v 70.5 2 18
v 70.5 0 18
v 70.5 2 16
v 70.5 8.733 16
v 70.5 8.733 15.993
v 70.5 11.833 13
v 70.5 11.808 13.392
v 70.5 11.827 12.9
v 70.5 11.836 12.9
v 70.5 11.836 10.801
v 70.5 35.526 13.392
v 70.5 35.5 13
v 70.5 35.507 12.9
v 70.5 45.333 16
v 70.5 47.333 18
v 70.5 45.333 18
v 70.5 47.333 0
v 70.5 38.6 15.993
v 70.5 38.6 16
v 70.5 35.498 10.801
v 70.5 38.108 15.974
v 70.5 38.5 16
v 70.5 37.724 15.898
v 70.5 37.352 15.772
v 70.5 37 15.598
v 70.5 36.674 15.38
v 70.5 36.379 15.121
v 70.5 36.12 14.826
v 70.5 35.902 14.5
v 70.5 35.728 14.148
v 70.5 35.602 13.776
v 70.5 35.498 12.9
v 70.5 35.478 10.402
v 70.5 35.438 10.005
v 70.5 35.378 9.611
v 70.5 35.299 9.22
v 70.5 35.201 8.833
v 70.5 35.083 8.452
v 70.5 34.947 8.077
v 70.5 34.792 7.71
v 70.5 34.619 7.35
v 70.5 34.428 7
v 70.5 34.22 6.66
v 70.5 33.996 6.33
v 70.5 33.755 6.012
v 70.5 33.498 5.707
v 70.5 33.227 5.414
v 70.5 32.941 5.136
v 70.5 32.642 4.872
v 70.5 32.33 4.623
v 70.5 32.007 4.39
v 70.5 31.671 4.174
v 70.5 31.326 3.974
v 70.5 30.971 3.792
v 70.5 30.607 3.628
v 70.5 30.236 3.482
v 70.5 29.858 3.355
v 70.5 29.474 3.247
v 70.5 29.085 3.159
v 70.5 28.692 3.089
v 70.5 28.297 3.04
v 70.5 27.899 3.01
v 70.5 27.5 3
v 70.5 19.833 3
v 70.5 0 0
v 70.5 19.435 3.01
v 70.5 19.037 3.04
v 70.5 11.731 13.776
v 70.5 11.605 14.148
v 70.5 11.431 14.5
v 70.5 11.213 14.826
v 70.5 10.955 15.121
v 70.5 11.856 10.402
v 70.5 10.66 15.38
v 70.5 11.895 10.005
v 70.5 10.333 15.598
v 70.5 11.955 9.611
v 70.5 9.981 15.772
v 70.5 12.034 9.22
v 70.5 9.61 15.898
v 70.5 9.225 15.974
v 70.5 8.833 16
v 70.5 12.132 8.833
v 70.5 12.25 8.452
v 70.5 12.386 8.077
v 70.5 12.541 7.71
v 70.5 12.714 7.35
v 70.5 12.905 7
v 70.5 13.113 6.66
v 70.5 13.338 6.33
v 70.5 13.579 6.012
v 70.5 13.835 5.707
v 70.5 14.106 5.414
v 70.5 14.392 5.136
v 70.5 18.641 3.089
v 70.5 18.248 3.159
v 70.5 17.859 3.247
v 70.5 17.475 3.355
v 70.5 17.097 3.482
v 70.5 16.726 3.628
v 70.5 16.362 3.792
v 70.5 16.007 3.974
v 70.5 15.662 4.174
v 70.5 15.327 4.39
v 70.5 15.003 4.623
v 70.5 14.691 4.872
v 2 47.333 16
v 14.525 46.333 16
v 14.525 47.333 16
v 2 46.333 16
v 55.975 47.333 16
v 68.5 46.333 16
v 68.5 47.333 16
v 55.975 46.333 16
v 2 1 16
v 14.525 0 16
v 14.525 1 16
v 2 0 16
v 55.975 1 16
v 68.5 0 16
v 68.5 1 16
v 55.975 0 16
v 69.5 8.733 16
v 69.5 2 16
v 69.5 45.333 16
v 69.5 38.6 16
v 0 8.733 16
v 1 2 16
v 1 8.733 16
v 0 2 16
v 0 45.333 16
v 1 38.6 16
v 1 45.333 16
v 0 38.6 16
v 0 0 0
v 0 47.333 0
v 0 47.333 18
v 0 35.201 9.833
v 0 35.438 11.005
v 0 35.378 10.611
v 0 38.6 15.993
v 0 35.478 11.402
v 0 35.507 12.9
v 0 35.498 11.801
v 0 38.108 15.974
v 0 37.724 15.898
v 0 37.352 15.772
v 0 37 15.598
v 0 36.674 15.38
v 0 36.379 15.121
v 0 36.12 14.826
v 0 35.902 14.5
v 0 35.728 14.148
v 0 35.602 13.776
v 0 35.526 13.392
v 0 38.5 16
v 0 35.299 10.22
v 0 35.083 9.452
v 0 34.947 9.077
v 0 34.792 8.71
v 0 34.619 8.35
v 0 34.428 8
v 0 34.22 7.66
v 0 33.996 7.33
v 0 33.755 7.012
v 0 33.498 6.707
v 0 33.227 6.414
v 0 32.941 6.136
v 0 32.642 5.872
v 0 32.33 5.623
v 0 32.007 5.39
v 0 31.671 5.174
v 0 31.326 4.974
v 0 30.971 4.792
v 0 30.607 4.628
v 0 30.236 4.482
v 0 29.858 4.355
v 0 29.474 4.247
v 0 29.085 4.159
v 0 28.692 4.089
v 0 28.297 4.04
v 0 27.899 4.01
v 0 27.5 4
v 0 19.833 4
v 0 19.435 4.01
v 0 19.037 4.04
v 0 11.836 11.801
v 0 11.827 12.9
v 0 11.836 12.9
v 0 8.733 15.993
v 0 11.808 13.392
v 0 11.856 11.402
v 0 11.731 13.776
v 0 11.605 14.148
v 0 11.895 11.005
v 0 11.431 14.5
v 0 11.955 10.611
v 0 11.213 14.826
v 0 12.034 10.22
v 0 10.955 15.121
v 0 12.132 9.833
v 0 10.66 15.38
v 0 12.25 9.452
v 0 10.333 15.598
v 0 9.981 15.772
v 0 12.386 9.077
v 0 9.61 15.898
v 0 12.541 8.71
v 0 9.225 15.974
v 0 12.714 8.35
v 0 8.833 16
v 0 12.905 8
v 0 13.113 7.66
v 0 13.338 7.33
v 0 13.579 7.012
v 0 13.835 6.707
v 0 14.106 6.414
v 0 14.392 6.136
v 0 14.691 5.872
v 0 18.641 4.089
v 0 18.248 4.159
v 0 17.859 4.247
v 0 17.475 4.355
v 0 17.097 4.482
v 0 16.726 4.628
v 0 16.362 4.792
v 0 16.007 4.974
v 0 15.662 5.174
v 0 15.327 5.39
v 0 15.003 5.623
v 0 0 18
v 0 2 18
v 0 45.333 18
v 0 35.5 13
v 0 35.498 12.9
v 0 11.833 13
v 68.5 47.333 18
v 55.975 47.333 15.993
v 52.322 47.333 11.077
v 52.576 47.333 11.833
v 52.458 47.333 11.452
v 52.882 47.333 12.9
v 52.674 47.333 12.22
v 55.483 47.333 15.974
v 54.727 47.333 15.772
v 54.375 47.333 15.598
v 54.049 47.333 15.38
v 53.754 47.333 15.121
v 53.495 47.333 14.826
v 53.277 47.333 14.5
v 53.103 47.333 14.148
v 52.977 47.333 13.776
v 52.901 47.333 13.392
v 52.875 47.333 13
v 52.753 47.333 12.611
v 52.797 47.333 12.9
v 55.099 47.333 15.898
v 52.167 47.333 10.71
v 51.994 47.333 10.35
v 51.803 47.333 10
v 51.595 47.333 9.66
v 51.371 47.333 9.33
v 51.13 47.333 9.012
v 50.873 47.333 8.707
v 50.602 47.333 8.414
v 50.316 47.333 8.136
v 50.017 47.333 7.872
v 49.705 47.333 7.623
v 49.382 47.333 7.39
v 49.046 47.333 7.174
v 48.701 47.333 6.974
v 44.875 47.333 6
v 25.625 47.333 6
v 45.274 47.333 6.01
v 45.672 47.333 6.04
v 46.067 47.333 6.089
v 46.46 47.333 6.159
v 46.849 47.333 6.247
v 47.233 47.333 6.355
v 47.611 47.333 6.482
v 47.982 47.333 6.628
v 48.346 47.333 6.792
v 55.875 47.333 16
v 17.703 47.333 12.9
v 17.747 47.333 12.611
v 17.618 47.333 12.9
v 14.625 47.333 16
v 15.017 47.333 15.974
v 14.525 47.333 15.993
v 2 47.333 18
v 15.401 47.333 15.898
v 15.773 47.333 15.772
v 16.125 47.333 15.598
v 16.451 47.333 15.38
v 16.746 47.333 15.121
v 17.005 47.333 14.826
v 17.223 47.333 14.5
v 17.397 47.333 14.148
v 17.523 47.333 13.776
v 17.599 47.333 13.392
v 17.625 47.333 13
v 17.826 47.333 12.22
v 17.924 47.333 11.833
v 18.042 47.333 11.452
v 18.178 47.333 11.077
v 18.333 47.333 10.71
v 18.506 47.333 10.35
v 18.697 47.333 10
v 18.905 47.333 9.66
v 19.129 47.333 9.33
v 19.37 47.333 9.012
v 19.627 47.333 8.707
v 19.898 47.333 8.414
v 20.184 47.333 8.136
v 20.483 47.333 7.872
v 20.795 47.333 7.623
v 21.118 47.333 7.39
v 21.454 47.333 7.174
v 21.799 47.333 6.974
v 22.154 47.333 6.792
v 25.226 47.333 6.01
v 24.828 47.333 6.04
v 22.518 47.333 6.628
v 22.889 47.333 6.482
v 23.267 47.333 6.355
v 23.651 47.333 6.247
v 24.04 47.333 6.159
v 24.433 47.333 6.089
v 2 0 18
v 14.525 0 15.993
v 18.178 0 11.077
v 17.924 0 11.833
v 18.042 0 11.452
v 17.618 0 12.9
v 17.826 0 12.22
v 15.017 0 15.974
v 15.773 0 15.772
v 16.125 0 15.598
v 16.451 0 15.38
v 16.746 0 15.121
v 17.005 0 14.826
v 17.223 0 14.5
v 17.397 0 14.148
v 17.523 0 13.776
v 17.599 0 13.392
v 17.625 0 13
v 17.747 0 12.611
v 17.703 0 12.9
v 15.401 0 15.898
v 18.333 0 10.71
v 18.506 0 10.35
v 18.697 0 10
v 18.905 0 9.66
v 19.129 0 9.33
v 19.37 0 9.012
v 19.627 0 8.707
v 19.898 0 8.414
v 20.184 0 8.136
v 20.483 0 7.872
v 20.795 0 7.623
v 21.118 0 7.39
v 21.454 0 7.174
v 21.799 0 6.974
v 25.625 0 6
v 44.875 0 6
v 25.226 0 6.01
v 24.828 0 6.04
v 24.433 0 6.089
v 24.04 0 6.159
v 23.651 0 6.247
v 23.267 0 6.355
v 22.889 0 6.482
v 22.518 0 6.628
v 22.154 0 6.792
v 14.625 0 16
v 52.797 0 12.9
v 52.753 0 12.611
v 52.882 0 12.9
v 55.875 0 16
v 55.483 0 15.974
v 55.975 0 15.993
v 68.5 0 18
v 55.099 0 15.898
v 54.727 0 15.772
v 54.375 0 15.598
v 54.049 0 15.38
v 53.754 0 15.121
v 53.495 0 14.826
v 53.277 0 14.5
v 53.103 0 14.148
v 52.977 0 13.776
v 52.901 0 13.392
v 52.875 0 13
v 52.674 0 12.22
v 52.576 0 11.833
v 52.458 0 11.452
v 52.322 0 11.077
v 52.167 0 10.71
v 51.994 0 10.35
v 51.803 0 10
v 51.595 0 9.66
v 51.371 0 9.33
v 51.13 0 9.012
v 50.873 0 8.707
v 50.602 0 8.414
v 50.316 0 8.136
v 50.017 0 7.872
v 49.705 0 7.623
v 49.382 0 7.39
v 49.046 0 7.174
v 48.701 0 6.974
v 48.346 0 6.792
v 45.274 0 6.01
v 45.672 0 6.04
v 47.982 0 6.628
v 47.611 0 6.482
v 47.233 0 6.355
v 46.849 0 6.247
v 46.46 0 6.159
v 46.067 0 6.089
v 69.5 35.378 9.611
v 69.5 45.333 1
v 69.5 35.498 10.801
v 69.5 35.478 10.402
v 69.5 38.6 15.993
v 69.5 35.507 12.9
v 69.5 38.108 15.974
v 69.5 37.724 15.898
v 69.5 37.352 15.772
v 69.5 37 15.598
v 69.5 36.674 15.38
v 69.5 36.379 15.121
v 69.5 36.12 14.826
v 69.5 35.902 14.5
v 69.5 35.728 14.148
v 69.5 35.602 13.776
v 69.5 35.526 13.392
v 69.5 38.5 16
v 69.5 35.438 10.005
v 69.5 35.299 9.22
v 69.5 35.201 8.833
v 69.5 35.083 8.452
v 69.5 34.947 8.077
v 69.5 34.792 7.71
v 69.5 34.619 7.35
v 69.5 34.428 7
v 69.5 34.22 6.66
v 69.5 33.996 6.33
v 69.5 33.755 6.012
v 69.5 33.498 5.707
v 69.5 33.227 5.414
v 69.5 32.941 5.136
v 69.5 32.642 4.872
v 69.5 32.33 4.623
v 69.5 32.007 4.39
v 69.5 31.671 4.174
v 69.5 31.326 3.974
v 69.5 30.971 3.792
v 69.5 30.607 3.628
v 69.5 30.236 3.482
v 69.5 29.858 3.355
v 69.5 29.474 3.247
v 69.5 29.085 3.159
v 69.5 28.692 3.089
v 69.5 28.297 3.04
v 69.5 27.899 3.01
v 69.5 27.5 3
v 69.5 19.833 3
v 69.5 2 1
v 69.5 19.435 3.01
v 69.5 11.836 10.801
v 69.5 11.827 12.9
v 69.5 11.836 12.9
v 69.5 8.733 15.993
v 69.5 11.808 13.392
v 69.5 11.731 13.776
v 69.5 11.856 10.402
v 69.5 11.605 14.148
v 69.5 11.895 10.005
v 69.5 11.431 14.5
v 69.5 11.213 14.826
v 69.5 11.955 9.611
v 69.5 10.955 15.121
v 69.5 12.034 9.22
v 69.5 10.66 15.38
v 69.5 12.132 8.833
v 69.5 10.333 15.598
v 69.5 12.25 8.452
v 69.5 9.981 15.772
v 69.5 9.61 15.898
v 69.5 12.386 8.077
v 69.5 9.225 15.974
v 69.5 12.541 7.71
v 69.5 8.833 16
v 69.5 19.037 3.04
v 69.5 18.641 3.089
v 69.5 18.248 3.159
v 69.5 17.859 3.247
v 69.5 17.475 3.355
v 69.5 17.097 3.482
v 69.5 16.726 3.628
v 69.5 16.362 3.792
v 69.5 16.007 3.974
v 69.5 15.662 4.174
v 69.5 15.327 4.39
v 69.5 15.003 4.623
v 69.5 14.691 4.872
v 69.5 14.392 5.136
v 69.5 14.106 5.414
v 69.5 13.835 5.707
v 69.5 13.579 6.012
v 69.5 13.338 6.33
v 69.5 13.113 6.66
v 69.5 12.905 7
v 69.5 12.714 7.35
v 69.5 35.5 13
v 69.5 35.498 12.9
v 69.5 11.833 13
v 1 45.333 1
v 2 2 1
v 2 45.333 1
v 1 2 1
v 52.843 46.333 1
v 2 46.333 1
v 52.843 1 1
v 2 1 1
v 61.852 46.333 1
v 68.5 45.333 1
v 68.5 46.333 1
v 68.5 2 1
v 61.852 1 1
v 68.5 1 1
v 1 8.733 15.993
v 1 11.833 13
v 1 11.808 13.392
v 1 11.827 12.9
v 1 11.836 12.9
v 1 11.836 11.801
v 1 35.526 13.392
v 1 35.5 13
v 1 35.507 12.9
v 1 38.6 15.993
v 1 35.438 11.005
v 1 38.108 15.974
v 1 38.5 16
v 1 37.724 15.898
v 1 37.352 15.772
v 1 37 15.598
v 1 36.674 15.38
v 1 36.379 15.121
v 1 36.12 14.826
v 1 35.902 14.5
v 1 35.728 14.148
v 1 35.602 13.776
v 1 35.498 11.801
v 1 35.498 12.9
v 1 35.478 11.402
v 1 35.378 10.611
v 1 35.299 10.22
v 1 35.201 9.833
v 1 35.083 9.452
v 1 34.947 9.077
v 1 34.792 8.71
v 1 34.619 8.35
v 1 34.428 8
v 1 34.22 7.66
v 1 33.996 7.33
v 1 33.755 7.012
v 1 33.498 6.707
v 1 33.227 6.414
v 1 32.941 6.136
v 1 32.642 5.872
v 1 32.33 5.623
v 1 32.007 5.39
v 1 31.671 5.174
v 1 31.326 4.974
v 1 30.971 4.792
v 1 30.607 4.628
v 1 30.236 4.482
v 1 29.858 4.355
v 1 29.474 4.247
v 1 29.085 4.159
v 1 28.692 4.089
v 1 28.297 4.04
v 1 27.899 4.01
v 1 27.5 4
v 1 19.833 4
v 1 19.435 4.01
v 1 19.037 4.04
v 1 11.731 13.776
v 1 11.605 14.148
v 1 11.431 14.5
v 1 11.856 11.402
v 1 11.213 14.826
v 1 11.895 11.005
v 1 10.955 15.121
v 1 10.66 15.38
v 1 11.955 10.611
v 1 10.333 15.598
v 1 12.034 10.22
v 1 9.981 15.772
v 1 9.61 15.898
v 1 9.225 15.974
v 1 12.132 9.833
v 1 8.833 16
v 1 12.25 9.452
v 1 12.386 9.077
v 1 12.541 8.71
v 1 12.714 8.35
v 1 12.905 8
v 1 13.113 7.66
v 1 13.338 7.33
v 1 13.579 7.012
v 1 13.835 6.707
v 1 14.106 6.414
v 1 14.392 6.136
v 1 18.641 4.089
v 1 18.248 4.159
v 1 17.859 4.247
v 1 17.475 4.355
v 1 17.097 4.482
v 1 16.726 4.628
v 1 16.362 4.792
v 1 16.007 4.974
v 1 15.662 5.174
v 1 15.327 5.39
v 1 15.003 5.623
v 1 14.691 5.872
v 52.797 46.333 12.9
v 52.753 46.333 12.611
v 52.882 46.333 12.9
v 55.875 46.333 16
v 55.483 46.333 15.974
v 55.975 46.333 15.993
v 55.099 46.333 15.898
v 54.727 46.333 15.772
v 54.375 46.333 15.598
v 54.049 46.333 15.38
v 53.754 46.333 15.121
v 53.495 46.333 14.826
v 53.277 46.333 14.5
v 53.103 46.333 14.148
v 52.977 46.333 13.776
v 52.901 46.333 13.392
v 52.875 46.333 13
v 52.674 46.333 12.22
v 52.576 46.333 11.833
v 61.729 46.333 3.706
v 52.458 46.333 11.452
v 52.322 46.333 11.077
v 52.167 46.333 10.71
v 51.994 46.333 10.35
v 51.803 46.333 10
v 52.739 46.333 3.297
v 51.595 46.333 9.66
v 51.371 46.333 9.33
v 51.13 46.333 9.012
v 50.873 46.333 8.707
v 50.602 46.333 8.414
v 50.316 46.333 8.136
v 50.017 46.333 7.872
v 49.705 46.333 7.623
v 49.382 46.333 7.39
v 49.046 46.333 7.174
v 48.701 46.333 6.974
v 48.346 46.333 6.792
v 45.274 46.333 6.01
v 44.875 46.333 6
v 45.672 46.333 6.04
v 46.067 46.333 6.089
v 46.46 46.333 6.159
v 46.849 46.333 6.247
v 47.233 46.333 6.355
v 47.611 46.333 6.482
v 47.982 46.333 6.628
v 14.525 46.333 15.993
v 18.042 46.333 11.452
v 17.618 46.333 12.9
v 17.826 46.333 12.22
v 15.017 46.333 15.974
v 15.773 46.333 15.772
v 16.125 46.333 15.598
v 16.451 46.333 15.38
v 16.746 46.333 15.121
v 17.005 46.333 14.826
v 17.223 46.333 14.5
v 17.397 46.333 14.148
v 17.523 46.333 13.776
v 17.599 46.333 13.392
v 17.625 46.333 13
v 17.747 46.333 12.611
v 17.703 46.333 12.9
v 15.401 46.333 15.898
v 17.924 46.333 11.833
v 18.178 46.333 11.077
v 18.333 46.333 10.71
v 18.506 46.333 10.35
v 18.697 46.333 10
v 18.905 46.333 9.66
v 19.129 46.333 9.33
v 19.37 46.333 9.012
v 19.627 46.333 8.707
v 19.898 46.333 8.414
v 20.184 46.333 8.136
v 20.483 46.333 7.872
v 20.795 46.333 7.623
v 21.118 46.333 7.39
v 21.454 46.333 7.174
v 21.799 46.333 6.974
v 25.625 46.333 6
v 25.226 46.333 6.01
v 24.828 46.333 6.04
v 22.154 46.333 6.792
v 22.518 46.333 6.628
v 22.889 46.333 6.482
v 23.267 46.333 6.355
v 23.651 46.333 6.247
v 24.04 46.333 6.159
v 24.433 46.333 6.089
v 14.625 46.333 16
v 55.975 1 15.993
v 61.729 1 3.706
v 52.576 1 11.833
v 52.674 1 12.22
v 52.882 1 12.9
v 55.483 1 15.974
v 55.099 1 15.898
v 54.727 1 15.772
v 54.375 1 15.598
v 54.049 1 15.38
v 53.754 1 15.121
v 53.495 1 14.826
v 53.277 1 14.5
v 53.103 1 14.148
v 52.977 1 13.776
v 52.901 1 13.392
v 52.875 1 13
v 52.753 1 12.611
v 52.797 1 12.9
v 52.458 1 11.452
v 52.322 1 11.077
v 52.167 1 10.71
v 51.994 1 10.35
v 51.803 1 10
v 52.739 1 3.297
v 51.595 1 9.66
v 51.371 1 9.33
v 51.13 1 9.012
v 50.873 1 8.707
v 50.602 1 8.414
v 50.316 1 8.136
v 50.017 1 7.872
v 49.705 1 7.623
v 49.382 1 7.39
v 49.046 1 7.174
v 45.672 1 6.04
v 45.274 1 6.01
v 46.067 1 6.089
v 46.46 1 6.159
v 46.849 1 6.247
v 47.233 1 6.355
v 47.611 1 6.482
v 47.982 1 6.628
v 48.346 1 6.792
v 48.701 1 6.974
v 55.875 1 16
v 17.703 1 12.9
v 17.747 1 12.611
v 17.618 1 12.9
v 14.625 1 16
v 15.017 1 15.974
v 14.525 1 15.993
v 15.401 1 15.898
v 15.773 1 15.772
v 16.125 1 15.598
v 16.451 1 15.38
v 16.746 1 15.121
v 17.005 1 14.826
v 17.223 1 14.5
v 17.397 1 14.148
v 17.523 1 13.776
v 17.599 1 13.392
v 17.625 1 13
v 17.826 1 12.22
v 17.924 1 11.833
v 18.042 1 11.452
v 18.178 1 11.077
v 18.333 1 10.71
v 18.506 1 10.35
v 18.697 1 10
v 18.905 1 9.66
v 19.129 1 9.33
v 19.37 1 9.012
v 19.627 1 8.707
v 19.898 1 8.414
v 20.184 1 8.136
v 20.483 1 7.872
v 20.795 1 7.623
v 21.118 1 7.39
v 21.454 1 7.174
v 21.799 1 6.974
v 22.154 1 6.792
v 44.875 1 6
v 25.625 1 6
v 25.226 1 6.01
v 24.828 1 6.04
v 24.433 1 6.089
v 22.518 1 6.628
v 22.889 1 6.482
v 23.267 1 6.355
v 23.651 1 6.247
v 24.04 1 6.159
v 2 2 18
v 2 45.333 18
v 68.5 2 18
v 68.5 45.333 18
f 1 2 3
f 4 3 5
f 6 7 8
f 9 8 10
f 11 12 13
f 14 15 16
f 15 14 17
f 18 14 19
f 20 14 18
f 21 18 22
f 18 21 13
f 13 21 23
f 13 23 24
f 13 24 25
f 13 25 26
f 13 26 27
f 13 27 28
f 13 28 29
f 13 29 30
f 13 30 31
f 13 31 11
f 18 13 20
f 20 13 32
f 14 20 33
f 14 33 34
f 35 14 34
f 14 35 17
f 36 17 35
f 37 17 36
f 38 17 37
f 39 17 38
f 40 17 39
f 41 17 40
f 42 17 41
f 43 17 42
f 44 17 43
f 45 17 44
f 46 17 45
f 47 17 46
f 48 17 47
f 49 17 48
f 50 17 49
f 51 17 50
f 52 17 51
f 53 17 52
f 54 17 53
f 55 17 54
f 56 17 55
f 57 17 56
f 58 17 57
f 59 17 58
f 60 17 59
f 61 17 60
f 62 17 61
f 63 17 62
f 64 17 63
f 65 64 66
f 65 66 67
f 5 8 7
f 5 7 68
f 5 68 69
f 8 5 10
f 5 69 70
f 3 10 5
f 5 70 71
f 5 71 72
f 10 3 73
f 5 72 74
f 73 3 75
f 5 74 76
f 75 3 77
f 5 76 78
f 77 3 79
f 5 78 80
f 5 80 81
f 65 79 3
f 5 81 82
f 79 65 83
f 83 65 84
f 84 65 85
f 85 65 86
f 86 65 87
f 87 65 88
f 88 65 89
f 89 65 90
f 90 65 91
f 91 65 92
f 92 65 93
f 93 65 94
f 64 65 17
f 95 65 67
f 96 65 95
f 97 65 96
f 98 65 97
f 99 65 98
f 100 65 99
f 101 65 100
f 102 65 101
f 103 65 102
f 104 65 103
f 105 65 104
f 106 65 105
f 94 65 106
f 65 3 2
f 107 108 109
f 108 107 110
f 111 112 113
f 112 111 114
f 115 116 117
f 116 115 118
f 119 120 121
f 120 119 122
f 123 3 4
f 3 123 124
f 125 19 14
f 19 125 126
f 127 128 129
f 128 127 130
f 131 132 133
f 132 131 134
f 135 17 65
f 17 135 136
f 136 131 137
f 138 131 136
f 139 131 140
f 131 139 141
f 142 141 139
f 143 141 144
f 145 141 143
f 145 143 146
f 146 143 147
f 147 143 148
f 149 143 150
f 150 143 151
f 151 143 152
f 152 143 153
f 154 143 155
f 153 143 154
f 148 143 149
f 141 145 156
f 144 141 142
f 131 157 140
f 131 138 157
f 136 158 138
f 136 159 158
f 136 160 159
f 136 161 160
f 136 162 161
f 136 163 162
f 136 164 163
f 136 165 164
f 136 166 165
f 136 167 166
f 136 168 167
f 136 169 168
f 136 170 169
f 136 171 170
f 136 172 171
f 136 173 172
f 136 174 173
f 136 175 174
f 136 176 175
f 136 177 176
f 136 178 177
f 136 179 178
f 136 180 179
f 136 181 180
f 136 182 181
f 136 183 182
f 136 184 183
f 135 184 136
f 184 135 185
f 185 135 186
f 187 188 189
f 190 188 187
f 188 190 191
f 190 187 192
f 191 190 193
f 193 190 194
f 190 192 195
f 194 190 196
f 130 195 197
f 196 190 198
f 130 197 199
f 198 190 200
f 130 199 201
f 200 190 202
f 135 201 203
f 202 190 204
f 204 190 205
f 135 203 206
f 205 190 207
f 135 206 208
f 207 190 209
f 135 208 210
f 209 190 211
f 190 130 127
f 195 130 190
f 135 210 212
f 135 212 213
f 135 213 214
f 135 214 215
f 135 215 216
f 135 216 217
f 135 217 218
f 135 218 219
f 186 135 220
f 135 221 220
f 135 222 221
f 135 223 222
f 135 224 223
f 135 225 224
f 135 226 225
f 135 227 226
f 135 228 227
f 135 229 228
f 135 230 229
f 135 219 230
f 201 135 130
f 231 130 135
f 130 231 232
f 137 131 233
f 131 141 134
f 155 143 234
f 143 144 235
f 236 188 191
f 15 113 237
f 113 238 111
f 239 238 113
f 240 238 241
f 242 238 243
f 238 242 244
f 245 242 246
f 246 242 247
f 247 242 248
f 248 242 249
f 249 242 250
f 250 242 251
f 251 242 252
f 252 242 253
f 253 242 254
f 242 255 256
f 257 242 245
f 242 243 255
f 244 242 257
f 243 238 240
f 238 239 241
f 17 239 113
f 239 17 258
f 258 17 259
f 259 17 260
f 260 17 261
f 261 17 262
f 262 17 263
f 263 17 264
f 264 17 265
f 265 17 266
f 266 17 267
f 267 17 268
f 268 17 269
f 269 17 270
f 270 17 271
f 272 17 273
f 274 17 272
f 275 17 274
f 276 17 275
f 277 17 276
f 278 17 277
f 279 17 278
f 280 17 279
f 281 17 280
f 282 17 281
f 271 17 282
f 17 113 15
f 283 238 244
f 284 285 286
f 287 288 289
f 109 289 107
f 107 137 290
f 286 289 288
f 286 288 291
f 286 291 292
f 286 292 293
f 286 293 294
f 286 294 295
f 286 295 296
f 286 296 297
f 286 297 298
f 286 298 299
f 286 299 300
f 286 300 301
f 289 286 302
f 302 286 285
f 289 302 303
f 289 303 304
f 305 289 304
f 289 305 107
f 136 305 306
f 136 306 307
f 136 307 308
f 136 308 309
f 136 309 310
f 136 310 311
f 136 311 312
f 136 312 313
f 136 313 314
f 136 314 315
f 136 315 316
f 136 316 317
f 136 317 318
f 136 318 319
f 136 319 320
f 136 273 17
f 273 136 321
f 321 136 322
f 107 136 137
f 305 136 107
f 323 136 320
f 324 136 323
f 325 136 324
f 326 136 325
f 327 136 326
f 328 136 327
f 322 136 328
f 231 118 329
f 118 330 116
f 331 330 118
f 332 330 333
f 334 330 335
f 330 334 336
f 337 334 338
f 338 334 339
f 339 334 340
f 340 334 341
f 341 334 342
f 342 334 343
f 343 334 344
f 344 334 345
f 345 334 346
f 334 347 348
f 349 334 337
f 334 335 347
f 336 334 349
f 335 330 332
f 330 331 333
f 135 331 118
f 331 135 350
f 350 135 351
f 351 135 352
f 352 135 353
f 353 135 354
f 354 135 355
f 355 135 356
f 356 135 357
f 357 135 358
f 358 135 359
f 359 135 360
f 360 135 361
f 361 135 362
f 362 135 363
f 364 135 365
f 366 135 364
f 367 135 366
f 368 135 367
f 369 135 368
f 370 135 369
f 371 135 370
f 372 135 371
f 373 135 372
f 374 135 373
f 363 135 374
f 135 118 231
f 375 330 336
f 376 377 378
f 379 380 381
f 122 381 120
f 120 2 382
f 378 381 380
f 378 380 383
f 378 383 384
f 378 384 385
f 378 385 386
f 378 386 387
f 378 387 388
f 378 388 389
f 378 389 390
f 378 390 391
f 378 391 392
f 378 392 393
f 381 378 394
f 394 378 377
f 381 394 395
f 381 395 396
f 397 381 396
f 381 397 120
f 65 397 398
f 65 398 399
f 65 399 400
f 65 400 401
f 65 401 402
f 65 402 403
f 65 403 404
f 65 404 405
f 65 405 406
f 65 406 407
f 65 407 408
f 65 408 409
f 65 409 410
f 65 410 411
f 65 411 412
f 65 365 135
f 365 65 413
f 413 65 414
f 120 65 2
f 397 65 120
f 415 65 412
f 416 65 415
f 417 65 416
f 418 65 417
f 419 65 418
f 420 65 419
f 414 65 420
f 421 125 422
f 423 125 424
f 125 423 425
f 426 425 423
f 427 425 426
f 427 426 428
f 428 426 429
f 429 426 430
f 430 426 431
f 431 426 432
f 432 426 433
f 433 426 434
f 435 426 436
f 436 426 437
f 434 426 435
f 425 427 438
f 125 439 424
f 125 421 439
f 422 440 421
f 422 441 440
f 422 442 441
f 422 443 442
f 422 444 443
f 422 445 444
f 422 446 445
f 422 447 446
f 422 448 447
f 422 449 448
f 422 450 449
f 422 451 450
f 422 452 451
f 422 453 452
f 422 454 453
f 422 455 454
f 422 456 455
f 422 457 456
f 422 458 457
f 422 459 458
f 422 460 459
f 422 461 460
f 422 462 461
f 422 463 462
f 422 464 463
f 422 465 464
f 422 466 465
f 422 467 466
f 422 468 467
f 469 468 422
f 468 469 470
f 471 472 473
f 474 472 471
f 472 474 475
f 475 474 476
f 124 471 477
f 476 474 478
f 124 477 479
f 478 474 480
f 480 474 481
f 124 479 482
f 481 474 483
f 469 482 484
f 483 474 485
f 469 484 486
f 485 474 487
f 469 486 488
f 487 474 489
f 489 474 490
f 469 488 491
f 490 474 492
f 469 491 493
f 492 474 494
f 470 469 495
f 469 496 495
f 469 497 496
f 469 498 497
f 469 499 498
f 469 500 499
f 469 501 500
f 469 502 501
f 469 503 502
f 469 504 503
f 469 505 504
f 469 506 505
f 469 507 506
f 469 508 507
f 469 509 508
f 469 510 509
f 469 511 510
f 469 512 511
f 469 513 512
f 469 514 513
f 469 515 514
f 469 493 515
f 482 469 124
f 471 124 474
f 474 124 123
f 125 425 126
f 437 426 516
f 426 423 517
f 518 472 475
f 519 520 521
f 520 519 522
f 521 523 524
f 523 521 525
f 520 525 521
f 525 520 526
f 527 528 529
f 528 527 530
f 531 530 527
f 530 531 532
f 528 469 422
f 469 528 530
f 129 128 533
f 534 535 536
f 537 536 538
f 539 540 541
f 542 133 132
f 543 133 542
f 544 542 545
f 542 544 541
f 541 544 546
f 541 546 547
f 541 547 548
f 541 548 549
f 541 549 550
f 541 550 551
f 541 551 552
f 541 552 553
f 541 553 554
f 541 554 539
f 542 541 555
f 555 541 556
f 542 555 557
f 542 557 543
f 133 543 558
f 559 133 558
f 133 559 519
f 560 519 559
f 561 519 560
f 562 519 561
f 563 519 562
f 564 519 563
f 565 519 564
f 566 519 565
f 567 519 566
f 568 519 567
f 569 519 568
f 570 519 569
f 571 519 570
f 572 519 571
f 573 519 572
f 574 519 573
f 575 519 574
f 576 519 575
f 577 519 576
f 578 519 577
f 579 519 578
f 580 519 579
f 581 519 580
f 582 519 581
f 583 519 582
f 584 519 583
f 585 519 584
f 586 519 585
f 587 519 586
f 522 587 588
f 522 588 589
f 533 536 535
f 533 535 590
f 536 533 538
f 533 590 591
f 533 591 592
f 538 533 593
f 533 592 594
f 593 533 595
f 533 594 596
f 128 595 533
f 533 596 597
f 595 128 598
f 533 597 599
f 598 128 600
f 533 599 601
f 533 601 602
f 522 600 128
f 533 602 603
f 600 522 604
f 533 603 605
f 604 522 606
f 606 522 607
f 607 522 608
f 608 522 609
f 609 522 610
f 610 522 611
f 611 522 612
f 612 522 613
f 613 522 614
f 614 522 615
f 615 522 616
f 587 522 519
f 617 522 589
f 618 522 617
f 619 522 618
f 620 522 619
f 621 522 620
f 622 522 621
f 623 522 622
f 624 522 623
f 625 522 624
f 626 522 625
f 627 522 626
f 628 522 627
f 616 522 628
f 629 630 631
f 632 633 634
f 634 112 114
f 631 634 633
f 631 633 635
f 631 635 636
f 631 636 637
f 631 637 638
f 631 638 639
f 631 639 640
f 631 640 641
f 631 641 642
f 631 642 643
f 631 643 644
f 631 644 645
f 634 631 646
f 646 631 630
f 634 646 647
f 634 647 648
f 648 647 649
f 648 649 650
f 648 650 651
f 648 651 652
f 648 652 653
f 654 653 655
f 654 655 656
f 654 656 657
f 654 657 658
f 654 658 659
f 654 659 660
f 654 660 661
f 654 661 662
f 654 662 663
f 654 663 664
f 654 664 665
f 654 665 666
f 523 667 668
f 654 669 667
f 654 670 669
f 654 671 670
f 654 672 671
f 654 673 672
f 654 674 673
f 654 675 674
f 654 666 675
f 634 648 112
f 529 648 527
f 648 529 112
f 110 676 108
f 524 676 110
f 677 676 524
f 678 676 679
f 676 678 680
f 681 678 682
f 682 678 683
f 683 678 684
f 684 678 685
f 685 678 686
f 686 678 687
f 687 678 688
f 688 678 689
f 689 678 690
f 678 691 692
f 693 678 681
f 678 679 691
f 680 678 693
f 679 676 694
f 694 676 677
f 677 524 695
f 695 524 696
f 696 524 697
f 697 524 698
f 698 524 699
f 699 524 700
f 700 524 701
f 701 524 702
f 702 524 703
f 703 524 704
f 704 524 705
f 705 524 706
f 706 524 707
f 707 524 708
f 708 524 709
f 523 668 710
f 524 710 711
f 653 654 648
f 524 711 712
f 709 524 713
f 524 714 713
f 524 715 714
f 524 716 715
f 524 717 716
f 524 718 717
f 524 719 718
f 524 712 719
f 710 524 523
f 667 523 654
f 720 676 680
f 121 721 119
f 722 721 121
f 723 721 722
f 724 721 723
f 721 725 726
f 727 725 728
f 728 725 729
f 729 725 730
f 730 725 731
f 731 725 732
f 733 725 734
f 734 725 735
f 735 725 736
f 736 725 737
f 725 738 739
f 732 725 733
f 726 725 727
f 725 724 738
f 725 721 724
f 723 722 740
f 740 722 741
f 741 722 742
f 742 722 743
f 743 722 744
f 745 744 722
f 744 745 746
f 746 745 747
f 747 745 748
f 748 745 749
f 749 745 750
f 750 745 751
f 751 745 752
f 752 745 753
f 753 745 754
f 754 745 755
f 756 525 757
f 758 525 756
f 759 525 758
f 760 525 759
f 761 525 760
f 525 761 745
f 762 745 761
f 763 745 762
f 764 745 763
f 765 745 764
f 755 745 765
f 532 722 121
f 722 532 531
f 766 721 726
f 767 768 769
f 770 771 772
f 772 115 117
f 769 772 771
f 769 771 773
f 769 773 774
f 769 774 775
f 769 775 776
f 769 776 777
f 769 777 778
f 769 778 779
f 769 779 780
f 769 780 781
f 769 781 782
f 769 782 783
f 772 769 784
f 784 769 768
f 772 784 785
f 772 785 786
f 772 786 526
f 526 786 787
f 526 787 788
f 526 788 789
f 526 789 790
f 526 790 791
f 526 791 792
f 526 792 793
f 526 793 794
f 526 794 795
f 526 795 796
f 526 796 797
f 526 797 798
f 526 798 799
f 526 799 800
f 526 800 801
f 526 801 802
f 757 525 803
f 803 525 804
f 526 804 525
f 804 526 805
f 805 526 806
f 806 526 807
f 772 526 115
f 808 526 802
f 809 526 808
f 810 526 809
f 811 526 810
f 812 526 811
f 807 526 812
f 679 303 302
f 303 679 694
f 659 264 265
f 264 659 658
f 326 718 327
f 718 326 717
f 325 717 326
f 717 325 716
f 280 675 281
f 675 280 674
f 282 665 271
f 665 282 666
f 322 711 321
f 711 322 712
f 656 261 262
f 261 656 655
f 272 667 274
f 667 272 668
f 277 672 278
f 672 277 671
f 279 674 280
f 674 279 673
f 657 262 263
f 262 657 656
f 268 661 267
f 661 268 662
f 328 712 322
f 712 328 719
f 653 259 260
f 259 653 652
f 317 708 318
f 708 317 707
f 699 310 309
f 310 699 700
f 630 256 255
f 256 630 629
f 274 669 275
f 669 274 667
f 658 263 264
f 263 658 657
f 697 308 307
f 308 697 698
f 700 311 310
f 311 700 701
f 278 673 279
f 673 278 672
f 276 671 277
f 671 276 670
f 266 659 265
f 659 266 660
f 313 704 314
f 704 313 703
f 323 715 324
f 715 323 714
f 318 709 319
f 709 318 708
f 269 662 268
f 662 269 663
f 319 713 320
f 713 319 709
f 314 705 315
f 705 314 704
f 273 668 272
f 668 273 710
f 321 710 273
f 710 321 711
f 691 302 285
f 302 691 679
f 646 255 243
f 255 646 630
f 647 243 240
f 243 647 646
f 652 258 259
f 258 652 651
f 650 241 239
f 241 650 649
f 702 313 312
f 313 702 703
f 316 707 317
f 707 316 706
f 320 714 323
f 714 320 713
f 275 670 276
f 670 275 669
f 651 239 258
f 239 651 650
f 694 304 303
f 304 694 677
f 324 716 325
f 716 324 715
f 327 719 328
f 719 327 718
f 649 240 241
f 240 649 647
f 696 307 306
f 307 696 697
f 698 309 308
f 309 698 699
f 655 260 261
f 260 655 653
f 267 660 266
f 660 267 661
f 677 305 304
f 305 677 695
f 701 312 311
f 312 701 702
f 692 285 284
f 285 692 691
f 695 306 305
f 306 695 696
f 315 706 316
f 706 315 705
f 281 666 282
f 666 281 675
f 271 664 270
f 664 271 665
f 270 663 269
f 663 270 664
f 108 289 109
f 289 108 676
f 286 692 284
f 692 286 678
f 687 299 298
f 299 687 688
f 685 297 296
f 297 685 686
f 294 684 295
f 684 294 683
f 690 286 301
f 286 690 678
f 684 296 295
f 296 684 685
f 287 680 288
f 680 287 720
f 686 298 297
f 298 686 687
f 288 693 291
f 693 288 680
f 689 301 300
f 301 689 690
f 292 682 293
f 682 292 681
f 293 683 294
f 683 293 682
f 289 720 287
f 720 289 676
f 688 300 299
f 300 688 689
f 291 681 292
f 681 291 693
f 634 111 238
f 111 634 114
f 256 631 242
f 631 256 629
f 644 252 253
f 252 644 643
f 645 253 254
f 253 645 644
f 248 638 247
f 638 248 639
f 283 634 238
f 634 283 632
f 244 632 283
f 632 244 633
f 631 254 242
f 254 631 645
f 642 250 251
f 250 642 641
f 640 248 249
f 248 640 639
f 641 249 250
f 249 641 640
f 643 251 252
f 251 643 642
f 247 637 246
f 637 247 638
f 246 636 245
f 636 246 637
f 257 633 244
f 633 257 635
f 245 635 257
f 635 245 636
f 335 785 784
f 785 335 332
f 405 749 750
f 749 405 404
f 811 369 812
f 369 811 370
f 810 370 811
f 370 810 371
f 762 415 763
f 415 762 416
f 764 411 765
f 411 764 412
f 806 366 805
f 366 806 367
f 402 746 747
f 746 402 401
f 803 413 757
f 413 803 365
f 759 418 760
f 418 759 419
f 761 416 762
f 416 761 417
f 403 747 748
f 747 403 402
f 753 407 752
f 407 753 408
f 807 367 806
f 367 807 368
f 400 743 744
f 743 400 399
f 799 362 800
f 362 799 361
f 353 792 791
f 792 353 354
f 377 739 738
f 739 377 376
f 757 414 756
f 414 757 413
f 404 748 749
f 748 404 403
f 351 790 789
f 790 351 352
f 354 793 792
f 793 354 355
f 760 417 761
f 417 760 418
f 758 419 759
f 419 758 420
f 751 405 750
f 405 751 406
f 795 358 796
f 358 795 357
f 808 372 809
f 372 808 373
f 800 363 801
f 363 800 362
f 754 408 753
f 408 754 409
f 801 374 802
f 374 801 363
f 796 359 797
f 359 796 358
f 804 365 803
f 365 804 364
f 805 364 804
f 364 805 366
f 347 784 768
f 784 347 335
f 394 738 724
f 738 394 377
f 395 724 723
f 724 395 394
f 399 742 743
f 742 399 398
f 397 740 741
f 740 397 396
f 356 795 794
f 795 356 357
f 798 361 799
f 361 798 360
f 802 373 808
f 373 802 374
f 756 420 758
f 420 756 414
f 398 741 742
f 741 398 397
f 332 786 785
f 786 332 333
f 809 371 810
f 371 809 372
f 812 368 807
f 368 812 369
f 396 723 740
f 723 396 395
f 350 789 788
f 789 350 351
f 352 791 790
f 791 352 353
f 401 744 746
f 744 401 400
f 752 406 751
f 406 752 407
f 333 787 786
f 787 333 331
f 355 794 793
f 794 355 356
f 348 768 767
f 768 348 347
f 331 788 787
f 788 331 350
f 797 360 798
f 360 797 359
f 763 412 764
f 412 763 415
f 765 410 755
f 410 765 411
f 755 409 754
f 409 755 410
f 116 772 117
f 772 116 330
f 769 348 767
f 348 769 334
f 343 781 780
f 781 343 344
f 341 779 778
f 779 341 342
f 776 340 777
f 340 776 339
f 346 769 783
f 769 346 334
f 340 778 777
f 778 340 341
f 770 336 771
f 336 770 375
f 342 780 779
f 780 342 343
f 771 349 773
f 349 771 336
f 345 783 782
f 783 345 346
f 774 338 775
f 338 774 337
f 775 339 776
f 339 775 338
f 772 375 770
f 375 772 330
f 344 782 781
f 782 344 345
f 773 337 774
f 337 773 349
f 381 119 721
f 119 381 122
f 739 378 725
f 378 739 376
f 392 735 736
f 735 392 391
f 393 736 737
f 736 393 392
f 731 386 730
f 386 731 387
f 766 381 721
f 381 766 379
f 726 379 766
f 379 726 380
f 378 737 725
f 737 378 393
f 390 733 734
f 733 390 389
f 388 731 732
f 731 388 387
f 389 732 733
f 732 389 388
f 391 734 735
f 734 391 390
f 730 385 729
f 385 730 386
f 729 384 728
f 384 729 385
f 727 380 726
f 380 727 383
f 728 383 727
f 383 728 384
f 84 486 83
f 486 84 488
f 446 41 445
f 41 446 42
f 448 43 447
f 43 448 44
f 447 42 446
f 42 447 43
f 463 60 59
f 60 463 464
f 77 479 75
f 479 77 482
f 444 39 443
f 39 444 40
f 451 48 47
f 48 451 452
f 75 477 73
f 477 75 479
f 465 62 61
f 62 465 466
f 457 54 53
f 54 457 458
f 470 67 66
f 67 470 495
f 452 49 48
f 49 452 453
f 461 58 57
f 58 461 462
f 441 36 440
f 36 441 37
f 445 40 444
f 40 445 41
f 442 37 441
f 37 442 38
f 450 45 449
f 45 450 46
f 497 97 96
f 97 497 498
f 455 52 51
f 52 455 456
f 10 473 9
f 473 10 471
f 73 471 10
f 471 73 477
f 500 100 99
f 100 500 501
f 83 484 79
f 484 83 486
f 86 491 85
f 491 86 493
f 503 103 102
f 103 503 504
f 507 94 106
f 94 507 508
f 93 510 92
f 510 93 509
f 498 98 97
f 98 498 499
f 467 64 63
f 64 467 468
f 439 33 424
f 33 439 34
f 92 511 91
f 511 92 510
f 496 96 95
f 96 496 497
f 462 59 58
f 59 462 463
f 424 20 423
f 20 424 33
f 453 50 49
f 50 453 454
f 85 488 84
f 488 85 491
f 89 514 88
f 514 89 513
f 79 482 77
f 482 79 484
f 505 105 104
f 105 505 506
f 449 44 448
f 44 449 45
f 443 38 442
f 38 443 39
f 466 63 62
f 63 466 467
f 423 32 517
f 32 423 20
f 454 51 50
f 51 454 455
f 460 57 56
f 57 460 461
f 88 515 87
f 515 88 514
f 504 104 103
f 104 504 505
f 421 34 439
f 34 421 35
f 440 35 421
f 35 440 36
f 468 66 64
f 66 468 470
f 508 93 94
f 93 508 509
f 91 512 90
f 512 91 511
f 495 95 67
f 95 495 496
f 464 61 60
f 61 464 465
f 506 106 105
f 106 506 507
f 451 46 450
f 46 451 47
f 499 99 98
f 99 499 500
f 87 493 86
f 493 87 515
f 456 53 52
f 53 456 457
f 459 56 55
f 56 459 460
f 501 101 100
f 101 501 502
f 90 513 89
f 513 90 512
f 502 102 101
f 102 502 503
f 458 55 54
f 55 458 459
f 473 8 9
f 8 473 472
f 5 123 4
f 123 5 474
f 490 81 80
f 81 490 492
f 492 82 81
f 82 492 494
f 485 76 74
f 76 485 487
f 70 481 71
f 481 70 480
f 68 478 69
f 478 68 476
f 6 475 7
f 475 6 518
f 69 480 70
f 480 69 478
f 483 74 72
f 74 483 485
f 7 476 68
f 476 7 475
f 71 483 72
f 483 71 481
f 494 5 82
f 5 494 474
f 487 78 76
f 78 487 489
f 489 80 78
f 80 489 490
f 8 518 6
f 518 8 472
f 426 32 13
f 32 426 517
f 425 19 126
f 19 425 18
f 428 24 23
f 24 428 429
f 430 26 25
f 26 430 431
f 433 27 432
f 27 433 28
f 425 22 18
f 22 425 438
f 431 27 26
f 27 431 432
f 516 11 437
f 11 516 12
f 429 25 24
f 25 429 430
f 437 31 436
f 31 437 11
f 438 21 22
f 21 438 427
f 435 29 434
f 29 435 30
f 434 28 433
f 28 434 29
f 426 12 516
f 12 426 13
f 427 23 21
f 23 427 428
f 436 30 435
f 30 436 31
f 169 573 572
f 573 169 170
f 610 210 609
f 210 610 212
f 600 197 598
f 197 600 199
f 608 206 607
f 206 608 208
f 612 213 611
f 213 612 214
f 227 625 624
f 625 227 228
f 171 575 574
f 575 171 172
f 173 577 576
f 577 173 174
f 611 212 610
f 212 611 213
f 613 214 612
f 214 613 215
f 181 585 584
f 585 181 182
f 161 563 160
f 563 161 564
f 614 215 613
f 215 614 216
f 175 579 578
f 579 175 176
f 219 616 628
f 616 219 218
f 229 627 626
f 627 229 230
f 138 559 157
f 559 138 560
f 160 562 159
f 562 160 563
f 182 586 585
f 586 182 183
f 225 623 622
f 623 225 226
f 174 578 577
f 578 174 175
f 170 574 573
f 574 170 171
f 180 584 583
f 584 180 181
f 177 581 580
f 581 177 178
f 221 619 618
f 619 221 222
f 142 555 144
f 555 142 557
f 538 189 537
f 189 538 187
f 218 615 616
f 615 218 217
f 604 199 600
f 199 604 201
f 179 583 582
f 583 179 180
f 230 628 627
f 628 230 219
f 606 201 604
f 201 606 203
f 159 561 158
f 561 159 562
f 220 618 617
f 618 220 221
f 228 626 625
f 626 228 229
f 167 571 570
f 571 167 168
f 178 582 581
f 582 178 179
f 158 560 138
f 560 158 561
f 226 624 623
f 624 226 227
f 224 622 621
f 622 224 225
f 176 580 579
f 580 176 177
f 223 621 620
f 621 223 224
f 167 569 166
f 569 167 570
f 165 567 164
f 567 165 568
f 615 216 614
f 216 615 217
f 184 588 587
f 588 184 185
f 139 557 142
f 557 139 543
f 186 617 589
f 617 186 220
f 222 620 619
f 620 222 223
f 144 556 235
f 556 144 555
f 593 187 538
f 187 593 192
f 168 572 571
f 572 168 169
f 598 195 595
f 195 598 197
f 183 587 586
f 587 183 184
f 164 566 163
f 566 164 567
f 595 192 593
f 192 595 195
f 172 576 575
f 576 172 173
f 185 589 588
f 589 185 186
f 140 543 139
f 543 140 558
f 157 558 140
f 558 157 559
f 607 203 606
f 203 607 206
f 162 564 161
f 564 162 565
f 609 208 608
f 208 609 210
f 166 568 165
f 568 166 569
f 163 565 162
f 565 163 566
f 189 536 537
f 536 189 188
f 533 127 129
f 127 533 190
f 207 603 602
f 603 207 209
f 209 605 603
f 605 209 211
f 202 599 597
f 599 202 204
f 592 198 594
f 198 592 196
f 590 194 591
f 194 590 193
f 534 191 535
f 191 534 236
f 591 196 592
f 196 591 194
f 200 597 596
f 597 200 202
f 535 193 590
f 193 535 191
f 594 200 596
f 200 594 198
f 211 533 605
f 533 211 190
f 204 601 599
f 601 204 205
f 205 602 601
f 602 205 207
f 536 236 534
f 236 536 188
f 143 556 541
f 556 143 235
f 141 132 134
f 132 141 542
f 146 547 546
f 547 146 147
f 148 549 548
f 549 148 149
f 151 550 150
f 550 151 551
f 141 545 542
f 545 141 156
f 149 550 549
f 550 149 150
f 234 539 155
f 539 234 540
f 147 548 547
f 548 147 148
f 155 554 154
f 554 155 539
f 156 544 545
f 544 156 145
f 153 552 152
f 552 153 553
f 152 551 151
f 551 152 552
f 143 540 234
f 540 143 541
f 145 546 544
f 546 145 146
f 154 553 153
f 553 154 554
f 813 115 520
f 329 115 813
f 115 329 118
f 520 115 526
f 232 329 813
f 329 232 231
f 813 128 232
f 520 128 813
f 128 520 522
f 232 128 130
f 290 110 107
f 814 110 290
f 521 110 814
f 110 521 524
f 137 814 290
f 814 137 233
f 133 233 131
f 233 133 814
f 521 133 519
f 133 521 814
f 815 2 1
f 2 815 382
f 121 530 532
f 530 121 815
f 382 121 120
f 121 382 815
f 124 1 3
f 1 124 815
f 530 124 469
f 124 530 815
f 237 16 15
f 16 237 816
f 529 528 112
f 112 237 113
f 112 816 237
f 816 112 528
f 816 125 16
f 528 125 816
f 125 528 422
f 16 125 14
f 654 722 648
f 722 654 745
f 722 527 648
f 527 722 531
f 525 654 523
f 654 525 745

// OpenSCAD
// container trays: Money Cards & Container cubes; warehouse?
use <mylib.scad>;

p = .001;
pp = 2 * p;
t0 = 1.2;    // print thicker, use 0.6 print head
f = .15;
sqrt3 = sqrt(3);    // 1.732
sqrt3_2 = sqrt3/2;  // .866

contX = 10;
contY = 20;
contZ = 10;

sample = false;

w00 = sample ? 30 : 64;  // official card size [long dimension]
h00 = sample ? 23 : 43;  // official card size [short dimension]
t00 = 12/36;             // mm per card
ncards = 36;

h0 = h00+2;   // leave some slack (sleeves some day?)
w0 = w00+2;   // assert: w0*3 < cardy-2*ty

bz = 3;       // z-height of card block
ang = atan2(-bz, w0);

box_h = 162;
box_w = 263;
box_z = 43;   // maybe 44 or 45 for tight fit; available box z

tx = 1;
ty = 1;
tz = 1;

// base size of tray for cards
trayx = 140;
trayy = 140;
trayz = ncards * t00 + bz + ty;

cardx = (trayx - tx)/2 + tx;
cardy = (trayy - ty)/3 + ty; // extrnal width of card box
cardz = trayz;


// base size of tray for cubes
cboxx = 140;
cboxy = 140;
cboxz = 17.5;   // height of walls on containerBox


echo("w00, h00, t00, h0, w0", [w00, h00,t00, h0, w0, cardy-2*ty]);
// a stack of cyan cards (on lid) - pro'ly from chaos orientation; BYO 'tr'
// tr: offset card [x, y, z, r] with trr()
// - x: short dim of card (h00); 
// - y: long dim of card (w00); 
// - z: thickness (t00)
// - r: rotation [rx, ry, rz, cr] (cr: center of rotation: [x0, y0, z0])
// n: [1] cards in stack
// dxyz: [h00, w00, t00] dimension of card
// color: [cyan]
module card(tr = undef, n = 1, dxyz=[w00, h00, t00*.9], rgb="cyan")
{
  tr = def(tr, [ tx +  (h0 - h00) / 2, ty + (w0 - w00) / 2, tz ]);
  trr(tr) astack(n, [ 0, 0, t00 ], [0, ang, 0]) color(rgb, .5) roundedCube(dxyz, 3, true);
}

/** a container */
module container(c = "blue") {
  color(c)
  cube([contX, contY, contZ], false);
}

// size of posts:
px = 2; py = 2; pz = 2;

/** single box for 1 stack of cards */
module cardBox(nc = ncards) {

  dx = px; dy = py; tpz = trayz + pz;
  ss = false;

  slotifyX2([trayz, cardy/2, 3], [0, cardy/2, 4], undef, 3, ss)
  slotifyX2([trayz, cardy/2, 3], [cardx, cardy/2, bz], undef, 3, ss)
  slotifyY2([trayz, cardx/2, 3], [cardx/2, 0, 6], undef, 3, ss)
  slotifyY2([trayz, cardx/2, 3], [cardx/2, cardy, 6], undef, 3, ss)
  box([cardx, cardy, cardz]);
  trr([cardx * .75, 0, tz*.3, [0, ang, 0]]) color("red")  cube([9, cardy, bz]);
  astack(2, [ cardx-dx, 0, 0]) astack(2, [0, cardy-dy, 0]) color("green") cube([dx, dy, tpz]);
  atrans(loc, [[0, 0, 0], undef, 1]) card(undef, nc);
}

module cardTray() {
  astack(3, [0, cardy - ty, 0])  cardBox();
  trr([tx, trayy, 0, [0, 0, 180]])
  astack(3, [0, cardy - ty, 0])  cardBox();
}

module containerTray() {
  astack(3, [0, cardy - ty, 0])  containerBox();
  trr([tx, trayy, 0, [0, 0, 180]])
  astack(3, [0, cardy - ty, 0])  containerBox();
}

module containerBox() {
  x = cardx; y = cardy; z = cboxz; //cboxx/2; y = cboxy/3; z = cboxz;
  dx = px+f; dy = py+f; dz = pz + .8;
  f = 1;
  difference() 
  {
    box([x, y, z], [tx, ty, tz]);
    astack(2, [ x-px, 0, 0]) astack(2, [0, y-py, 0]) 
      trr([-pp, -pp, -pp]) cube([dx, dy, dz]);
  }
  atrans(loc, [[0,0,0]])
    astack(2, [0, contY+5*f, 0]) astack(6, [contX+f, 0, 0]) trr([tx, ty, tz]) container();
  // add bumps in corner:
  r = 2; d = 6;
  astack(2, [x - 2*d, 0, 0])
  astack(2, [0, y - 2*d, 0])
  trr([d, d, tz]) intersection() { sphere(r); trr([-r, -r, -p]) cube([2*r, 2*r, r]); }
}

loc = 2;

atrans(loc, [[0, 0, -trayz], undef, [0, 0, 0]]) cardBox();
atrans(loc, [[0, 0, 0], 0]) containerBox();

atrans(loc, [undef, undef, undef, [0, 0, -trayz]])
cardTray();
atrans(loc, [undef, undef, undef, [0, 0, 0]])
containerTray();
